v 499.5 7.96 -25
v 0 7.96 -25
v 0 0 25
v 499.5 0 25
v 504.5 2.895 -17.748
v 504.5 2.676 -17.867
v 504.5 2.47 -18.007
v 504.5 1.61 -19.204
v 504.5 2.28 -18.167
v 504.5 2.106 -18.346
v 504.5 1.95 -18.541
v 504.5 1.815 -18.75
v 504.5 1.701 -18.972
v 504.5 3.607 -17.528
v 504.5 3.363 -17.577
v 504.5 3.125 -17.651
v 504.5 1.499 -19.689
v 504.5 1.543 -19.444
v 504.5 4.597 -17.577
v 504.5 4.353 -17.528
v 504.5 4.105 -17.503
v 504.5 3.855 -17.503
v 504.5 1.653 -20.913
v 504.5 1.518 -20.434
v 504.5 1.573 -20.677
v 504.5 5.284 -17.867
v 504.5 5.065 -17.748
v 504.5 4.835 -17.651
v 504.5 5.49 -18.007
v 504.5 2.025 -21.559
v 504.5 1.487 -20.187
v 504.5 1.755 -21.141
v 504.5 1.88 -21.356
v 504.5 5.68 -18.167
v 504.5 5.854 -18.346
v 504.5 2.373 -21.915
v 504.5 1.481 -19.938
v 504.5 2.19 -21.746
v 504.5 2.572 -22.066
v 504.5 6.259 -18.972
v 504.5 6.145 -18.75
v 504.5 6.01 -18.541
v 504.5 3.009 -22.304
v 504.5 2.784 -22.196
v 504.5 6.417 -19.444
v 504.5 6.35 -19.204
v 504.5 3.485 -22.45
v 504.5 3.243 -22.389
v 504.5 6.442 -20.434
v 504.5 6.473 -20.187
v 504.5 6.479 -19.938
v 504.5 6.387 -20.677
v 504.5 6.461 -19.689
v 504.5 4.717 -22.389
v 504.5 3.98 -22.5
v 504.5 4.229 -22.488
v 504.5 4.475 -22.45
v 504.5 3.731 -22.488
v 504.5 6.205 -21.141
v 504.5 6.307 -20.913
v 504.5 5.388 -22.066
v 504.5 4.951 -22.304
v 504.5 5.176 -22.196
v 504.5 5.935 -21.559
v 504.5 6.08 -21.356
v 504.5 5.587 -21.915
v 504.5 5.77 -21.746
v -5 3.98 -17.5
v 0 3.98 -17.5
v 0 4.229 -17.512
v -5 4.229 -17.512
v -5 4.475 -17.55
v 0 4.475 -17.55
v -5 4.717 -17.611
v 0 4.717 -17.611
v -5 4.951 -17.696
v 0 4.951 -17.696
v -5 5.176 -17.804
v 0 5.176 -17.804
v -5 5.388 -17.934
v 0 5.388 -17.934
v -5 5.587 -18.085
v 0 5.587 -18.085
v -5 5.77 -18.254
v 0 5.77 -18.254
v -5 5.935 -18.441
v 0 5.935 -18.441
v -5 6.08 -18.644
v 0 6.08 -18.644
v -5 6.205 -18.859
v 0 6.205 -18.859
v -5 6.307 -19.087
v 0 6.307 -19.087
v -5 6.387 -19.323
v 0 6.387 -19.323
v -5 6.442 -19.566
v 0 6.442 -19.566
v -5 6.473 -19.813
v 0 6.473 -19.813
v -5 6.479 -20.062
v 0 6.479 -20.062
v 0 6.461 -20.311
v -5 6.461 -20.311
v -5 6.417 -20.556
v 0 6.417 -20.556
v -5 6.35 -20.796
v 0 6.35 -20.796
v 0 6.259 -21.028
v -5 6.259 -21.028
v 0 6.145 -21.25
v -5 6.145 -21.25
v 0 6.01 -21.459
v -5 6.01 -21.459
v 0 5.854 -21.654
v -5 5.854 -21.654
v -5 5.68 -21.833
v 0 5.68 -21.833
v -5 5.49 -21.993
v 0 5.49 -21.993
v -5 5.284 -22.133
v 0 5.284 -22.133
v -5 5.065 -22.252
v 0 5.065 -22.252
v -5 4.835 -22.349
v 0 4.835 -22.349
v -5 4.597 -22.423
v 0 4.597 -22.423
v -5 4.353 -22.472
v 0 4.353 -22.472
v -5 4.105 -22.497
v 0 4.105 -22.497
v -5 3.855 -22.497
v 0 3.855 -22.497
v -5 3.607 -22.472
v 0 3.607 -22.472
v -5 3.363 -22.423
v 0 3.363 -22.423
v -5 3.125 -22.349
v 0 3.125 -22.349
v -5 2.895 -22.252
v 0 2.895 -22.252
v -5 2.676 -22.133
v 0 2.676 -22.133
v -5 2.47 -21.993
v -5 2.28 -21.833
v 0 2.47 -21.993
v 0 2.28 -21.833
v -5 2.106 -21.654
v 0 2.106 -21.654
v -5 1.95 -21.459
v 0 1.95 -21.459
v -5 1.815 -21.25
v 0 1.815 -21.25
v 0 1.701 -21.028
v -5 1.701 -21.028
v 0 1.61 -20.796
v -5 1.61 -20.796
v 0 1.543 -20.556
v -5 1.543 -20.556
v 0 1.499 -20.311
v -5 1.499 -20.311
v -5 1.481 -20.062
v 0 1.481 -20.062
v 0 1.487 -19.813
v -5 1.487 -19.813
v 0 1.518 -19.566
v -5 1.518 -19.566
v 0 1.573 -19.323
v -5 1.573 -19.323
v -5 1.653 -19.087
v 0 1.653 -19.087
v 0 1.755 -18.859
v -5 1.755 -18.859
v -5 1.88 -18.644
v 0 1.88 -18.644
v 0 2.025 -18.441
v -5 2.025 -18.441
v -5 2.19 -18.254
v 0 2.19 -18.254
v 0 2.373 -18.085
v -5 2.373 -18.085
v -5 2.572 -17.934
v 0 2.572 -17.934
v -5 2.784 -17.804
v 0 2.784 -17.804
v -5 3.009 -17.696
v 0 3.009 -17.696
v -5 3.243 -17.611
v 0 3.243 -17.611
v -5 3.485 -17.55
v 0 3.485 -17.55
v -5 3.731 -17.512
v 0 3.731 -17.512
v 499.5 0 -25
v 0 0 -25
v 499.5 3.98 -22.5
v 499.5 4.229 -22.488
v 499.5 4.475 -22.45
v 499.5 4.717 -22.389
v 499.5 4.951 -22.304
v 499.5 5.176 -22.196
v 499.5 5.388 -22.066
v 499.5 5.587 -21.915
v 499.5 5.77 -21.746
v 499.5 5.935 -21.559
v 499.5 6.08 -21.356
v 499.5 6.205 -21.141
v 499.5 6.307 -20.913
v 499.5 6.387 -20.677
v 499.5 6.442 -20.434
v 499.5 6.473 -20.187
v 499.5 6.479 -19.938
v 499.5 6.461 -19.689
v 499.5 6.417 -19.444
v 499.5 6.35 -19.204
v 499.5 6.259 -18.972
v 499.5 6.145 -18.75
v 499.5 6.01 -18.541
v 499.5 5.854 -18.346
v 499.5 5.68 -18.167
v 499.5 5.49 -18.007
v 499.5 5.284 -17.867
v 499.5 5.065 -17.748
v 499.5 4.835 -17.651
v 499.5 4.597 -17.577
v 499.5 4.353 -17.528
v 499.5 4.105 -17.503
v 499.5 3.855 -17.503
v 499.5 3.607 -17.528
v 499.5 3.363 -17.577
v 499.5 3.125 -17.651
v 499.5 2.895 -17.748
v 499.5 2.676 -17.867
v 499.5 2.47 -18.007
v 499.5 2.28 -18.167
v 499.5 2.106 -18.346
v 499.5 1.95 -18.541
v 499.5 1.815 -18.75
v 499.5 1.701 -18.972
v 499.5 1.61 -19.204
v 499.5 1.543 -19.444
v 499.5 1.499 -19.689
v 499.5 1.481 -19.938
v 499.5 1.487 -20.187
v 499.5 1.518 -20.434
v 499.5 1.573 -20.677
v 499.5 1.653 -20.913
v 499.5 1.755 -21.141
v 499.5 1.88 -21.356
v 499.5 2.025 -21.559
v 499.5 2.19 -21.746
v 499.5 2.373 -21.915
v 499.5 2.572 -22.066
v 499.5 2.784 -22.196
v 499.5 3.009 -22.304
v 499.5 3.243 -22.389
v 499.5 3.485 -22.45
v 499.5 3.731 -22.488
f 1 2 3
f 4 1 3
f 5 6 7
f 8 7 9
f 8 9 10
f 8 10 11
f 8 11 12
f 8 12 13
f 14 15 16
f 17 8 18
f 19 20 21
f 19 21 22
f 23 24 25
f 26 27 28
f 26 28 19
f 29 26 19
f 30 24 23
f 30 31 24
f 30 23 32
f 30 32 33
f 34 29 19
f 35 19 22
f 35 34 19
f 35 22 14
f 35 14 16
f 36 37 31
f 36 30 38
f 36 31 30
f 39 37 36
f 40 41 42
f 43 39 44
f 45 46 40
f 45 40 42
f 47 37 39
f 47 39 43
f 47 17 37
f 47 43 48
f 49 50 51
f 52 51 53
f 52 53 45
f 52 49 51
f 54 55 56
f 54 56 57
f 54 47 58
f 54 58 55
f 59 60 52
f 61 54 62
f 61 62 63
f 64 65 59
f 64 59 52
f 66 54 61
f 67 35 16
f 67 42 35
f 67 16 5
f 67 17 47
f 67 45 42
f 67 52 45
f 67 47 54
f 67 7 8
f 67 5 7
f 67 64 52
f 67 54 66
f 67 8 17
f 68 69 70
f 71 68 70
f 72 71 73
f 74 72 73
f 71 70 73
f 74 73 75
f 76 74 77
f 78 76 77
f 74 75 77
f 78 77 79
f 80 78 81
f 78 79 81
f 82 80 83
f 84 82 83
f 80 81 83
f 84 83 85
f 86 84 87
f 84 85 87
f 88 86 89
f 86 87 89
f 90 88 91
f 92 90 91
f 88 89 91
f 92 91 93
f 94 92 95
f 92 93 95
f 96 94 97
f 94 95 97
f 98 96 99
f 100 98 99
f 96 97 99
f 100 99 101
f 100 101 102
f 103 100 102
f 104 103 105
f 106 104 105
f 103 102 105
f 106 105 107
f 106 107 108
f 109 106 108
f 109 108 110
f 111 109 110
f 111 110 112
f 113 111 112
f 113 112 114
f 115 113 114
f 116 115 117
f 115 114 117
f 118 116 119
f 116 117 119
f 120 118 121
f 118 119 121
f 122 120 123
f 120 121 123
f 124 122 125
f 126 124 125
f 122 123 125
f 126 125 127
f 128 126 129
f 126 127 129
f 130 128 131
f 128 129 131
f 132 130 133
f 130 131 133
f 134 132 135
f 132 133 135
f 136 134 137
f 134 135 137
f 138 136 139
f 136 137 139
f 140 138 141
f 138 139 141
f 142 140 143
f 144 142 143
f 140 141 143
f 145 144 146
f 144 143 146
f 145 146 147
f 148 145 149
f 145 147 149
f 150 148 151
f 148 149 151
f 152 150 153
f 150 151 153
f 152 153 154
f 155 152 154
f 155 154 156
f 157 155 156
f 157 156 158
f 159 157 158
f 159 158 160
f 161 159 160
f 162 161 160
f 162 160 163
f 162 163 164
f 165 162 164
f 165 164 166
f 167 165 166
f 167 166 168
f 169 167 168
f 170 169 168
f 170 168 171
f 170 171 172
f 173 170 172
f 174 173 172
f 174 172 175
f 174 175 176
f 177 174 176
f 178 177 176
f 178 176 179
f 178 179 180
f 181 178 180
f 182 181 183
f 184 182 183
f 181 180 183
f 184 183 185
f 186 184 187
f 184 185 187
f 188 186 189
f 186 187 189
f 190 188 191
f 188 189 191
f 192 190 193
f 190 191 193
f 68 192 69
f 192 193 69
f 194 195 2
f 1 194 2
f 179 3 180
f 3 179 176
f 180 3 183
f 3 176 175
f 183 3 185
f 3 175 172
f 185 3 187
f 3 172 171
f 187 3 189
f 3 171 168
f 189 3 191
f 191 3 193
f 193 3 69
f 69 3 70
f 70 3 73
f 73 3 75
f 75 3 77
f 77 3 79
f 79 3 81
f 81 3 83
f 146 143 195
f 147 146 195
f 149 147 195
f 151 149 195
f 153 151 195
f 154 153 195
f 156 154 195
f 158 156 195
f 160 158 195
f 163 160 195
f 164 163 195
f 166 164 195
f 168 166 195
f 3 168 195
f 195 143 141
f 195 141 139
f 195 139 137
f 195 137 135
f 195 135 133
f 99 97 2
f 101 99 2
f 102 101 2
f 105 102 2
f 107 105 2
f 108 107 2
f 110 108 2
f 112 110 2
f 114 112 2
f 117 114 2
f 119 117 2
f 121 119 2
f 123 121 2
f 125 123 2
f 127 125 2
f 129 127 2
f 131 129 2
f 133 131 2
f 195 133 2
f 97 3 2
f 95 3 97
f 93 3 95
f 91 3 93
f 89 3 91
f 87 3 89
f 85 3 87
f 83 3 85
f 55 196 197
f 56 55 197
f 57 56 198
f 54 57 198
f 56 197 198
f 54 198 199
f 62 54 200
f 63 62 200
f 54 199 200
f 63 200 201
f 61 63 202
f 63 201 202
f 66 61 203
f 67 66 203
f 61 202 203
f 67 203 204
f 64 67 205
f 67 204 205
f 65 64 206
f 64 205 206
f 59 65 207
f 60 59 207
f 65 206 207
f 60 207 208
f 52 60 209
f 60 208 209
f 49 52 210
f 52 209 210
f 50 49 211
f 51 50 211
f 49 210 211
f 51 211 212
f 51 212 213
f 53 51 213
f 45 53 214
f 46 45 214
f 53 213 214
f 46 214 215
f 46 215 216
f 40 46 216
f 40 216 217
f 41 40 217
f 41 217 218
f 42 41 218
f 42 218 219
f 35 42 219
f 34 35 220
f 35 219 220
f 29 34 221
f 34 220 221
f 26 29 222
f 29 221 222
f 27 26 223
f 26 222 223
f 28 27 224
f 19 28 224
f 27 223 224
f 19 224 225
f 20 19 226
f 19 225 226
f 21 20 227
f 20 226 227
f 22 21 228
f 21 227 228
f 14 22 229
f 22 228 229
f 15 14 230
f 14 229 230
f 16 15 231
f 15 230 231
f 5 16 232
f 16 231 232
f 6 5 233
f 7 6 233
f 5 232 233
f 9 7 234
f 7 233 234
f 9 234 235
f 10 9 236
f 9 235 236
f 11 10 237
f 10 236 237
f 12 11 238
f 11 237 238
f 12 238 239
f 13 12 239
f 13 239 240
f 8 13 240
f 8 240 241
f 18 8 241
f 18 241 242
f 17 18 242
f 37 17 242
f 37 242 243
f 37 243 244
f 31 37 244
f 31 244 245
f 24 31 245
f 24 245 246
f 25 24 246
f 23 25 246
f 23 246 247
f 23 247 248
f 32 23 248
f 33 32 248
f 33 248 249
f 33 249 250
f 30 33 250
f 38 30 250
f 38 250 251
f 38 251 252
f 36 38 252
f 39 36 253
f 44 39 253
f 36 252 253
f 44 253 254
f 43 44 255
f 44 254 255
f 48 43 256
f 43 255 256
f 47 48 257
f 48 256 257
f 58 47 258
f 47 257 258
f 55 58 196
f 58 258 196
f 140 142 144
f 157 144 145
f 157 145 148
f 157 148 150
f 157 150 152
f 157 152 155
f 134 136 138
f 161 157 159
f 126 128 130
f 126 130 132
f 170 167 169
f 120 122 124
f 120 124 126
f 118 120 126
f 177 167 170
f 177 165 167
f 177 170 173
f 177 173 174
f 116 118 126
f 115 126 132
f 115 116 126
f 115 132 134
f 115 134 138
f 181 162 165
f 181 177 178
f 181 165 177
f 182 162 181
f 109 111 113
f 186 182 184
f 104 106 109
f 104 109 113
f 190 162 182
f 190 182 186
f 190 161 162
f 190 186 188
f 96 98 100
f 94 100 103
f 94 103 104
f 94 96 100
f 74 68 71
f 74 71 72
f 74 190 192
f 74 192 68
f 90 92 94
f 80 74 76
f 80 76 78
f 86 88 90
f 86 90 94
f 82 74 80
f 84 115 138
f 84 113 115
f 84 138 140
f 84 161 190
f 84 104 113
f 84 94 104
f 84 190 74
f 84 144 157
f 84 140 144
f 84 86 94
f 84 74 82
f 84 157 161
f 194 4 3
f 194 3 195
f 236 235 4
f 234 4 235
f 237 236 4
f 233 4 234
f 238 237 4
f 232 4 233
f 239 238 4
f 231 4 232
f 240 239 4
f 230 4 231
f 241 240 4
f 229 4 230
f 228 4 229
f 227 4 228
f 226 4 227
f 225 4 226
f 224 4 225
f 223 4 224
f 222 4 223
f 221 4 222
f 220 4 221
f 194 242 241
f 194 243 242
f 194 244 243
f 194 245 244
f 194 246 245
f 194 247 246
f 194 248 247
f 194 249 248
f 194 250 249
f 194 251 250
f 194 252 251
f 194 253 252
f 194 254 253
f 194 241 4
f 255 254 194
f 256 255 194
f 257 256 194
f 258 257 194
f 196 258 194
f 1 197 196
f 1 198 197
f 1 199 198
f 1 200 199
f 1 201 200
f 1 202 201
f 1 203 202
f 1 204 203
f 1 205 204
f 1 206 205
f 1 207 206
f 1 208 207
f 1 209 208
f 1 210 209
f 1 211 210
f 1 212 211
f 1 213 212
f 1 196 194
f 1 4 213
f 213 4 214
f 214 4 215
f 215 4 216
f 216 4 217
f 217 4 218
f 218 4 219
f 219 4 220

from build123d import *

# Parameters (mm, degrees)
Y_KSEKLIK_EKSTR_ZYON2_DEPTH = 499.5
IZIM4_R                     = 2.5
Y_KSEKLIK_EKSTR_ZYON3_DEPTH = 5
IZIM5_R                     = 2.5
Y_KSEKLIK_EKSTR_ZYON4_DEPTH = 5


with BuildPart() as part:
    # Çizim2 → Yükseklik-Ekstrüzyon2 (new body)
    with BuildSketch(Plane(origin=(0, 0, 0), x_dir=(0, 0, -1), z_dir=(1, 0, 0))):
        Polygon((-25, 0), (25, 0), (25, 7.96), align=None)
    extrude(amount=Y_KSEKLIK_EKSTR_ZYON2_DEPTH)

    # Çizim4 → Yükseklik-Ekstrüzyon3 (add)
    with BuildSketch(Plane(origin=(499.5, 0, 0), x_dir=(0, 0, -1), z_dir=(1, 0, 0))):
        with Locations((20, 3.98)):
            Circle(IZIM4_R)
    extrude(amount=Y_KSEKLIK_EKSTR_ZYON3_DEPTH)

    # Çizim5 → Yükseklik-Ekstrüzyon4 (add)
    with BuildSketch(Plane.ZY):
        with Locations((-20, 3.98)):
            Circle(IZIM5_R)
    extrude(amount=Y_KSEKLIK_EKSTR_ZYON4_DEPTH)


solid = part.part
